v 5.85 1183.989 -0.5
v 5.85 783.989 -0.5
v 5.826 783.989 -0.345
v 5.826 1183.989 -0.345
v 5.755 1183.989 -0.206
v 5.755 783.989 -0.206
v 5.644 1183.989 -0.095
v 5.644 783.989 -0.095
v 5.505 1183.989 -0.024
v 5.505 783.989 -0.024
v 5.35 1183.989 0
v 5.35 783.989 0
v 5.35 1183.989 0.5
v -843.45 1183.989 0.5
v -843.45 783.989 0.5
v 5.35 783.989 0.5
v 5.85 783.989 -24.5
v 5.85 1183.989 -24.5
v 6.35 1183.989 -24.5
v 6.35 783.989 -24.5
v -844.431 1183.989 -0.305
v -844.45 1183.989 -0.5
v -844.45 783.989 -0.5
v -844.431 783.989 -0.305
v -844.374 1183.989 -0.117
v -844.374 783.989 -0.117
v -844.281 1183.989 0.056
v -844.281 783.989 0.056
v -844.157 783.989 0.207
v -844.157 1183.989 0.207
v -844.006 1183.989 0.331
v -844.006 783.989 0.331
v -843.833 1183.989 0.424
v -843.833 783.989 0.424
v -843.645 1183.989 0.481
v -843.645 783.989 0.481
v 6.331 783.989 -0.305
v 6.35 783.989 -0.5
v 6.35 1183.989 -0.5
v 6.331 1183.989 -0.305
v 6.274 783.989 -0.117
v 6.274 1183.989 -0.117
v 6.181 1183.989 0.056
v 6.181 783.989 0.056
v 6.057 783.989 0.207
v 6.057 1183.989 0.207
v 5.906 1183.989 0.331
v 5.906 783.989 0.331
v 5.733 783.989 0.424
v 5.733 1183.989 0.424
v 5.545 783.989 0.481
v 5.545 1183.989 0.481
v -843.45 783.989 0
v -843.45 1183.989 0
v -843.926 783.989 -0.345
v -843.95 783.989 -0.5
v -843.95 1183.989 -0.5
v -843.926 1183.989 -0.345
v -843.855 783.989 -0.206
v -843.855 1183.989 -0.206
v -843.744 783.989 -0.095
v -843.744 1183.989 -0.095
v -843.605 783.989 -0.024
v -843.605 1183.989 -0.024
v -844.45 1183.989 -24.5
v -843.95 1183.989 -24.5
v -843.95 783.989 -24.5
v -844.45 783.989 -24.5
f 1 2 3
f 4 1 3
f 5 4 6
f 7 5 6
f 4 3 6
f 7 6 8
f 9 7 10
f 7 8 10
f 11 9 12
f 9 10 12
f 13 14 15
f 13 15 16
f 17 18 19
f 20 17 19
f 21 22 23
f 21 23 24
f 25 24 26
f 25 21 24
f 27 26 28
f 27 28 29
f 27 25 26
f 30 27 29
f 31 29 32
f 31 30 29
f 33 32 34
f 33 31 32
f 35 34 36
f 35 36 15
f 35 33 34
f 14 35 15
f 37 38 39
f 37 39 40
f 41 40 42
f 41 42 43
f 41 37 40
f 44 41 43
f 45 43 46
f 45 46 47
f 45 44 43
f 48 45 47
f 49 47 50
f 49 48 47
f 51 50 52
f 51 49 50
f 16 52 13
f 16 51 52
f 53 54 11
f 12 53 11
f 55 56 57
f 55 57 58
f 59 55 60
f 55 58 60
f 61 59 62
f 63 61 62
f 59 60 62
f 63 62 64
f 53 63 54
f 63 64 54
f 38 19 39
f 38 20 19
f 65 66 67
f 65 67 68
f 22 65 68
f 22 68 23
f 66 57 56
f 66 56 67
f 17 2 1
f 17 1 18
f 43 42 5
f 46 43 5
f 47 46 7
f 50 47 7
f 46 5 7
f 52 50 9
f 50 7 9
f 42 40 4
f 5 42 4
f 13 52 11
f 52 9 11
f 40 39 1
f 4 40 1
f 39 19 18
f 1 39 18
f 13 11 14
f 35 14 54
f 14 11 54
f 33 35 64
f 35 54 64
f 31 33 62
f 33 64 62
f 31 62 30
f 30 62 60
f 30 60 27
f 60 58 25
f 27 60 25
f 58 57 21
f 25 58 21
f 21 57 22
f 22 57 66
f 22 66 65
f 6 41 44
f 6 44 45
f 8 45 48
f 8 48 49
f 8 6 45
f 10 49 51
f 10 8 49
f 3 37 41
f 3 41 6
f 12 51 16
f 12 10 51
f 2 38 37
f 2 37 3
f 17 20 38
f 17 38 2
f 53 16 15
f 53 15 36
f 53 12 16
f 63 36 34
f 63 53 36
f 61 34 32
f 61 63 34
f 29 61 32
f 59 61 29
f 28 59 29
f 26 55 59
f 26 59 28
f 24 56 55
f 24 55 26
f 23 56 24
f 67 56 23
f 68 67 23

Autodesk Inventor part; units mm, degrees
ref_plane "YZ Plane" through (0, 0, 0) normal (1, 0, 0) x (0, 1, 0)
ref_plane "XZ Plane" through (0, 0, 0) normal (0, 1, 0) x (-1, 0, 0)
ref_plane "XY Plane" through (0, 0, 0) normal (0, 0, 1) x (1, 0, 0)
ref_plane "Work Plane1" through (0, 0, 0) normal (0, 0, 1) x (1, 0, 0)
sketch "Sketch1" plane through (0, 0, 0) normal (0, 0, 1) x (1, 0, 0)
  line L0 (-849.45, 463.2386) -> (11.35, 463.2386)
  line L1 (11.35, 463.2386) -> (11.35, 863.2386)
  line L2 (11.35, 863.2386) -> (-849.45, 863.2386)
  line L3 (-849.45, 863.2386) -> (-849.45, 463.2386)
  line L4 (-844.45, 1225.4) -> (-844.45, -25.4)
  line L5 (6.35, -25.4) -> (6.35, 1225.4)
  point P0 (0, 0)
  point P1 (6.35, 463.2386)
  point P2 (6.35, 863.2386)
  point P3 (-844.45, 863.2386)
  point P4 (-844.45, 463.2386)
  dimension "d1" = 400
  dimension "d2" = 5
  dimension "d3" = 5
extrude "Plate1" add sketch "Sketch1" along normal blind 0.5 contours L4 L2 L5 L0
sketch "Sketch2" plane through (5.85, 863.2386, 0.5) normal (1, 0, 0) x (0, 1, 0)
  line L0 (-400, 0) -> (0, 0)
  line L1 (0, 0) -> (0, 25)
  line L2 (0, 25) -> (-400, 25)
  line L3 (-400, 25) -> (-400, 0)
edge flange "Flange1" height 25 angle 90 thickness 0.5 bend radius 0.5 thickness toward (1, 0, 0) relief tear relief width 0.5 relief depth 0.25 corner gap 0.5 corner form 0 edges at (6.35, 663.2386, 0.5) (-844.45, 663.2386, 0.5) wall of the first edge with corners at (5.85, 463.2386, 0.5) (5.85, 863.2386, 0.5) (5.85, 863.2386, -24.5) (5.85, 463.2386, -24.5)
bend "Bend1"
corner "Corner1"
move faces "Move1" translate (0, 320.75, 0) faces at (-560.5167, 463.2386, 0.3333) (-277.5833, 863.2386, 0.3333)
equation "\"d4\" = Thickness"
equation "\"d5\" = BendReliefWidth"
equation "\"d6\" = BendReliefDepth"
equation "\"d7\" = MinimumRemnant"
equation "\"d8\" = TransitionRadius"
equation "\"d11\" = BendRadius"
equation "\"d12\" = CornerReliefSize"
equation "\"d13\" = GapSize"
equation "\"d14\" = JacobiRadiusSize"
equation "\"BendRadius\" = Thickness"
equation "\"BendReliefWidth\" = Thickness"
equation "\"BendReliefDepth\" = 0.5 * Thickness"
equation "\"CornerReliefSize\" = 4 * Thickness"
equation "\"MinimumRemnant\" = 2 * Thickness"
equation "\"TransitionRadius\" = BendRadius"
equation "\"JacobiRadiusSize\" = BendRadius"
equation "\"GapSize\" = Thickness"
equation "\"Thickness\" = 0.5"
properties part number "ENGINE_BASE" material "Stainless Steel, Austenitic"
